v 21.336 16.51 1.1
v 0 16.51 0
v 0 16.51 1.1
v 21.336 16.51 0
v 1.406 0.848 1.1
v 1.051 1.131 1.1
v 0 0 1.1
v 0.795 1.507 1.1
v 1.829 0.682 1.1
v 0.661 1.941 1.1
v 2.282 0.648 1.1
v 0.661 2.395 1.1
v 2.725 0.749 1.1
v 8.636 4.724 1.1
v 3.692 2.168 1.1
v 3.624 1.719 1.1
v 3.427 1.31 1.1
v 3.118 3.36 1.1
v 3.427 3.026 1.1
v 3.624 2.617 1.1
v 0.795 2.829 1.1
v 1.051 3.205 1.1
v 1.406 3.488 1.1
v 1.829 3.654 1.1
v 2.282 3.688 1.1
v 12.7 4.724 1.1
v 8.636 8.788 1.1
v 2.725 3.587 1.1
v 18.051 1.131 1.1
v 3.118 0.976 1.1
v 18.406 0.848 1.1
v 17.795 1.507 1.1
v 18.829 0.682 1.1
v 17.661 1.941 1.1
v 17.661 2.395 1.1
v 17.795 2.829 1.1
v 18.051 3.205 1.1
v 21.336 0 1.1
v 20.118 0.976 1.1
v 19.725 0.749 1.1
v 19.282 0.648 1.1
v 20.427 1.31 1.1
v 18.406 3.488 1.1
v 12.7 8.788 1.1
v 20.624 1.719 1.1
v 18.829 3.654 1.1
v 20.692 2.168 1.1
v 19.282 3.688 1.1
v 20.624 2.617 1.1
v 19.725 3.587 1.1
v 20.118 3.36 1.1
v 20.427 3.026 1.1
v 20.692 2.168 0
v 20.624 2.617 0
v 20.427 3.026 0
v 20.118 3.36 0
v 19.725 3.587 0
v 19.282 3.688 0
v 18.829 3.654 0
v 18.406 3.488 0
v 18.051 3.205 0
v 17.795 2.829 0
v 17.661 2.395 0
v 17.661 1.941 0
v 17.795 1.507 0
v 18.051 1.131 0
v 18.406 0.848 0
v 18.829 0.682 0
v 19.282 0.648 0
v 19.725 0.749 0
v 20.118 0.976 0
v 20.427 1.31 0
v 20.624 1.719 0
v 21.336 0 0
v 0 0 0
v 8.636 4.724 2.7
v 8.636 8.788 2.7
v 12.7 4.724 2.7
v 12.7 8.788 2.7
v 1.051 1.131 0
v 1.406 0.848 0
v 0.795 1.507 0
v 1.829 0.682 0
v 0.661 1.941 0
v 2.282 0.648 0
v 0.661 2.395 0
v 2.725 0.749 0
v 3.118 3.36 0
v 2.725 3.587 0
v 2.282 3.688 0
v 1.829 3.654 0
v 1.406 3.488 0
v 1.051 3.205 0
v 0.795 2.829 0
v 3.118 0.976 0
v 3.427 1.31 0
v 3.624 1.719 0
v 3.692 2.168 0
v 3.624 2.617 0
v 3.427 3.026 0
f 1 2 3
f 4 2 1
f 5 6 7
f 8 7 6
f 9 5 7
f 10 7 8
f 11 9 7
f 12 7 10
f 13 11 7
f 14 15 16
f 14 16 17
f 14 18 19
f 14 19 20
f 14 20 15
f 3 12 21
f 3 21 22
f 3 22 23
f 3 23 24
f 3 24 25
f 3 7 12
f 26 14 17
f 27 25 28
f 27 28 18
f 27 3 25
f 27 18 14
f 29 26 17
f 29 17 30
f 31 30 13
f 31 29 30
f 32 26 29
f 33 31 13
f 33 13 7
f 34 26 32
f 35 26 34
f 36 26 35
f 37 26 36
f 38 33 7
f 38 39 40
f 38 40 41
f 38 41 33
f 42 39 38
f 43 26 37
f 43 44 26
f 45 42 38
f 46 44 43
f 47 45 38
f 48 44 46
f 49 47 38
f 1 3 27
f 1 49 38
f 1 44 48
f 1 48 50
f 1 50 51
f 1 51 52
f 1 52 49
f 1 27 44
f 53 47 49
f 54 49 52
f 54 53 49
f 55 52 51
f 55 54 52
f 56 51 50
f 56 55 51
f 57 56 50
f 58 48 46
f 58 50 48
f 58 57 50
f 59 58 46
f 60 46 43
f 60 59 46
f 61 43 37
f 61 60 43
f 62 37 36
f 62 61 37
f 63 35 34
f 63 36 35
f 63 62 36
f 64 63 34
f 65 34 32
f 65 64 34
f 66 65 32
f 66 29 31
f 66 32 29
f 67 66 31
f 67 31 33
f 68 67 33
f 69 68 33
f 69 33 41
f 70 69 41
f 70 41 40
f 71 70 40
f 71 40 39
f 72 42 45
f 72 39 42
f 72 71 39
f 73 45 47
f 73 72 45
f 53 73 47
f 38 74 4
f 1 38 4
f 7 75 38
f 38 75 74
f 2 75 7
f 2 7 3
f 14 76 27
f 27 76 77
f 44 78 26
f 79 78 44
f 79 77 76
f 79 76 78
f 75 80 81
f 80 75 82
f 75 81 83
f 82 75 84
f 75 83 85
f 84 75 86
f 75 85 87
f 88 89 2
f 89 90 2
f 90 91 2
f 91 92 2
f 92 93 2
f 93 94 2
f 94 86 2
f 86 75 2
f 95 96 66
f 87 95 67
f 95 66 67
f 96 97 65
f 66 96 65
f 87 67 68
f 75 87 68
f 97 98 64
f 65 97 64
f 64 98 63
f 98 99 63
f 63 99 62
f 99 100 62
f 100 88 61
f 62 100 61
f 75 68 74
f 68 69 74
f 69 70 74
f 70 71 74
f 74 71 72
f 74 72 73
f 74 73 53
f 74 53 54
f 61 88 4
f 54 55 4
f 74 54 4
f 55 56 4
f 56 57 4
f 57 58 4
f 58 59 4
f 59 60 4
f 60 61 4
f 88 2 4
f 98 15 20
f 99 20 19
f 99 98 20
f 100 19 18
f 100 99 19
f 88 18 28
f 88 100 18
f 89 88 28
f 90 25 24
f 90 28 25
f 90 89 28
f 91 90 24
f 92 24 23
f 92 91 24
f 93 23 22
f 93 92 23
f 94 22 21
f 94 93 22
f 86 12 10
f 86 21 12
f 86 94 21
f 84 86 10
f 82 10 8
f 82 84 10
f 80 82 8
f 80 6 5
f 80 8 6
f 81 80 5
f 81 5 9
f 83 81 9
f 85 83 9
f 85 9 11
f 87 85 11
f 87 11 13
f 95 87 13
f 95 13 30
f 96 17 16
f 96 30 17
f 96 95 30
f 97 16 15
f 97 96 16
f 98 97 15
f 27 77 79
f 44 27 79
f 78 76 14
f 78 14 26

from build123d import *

# Parameters (mm, degrees)
SKETCH1_W           = 21.336
SKETCH1_H           = 16.51
SKETCH1_R           = 1.524
BOSS_EXTRUDE1_DEPTH = 2.7
SKETCH2_OUTSIDE_W   = 28.758
SKETCH2_OUTSIDE_H   = 23.932
SKETCH2_OUTSIDE_W_2 = 4.064
SKETCH2_OUTSIDE_H_2 = 4.064
CUT_EXTRUDE1_DEPTH  = 1.6002


with BuildPart() as part:
    # Sketch1 → Boss-Extrude1 (new body)
    with BuildSketch(Plane.XY):
        with Locations((10.668, 8.255)):
            Rectangle(SKETCH1_W, SKETCH1_H)
        with Locations((2.168, 2.168)):
            Circle(SKETCH1_R, mode=Mode.SUBTRACT)
        with Locations((19.168, 2.168)):
            Circle(SKETCH1_R, mode=Mode.SUBTRACT)
    extrude(amount=BOSS_EXTRUDE1_DEPTH)

    # Sketch2 outside → Cut-Extrude1 (cut)
    with BuildSketch(Plane.XY.offset(2.7)):
        with Locations((10.668, 8.255)):
            Rectangle(SKETCH2_OUTSIDE_W, SKETCH2_OUTSIDE_H)
        with Locations((10.668, 6.7564)):
            Rectangle(SKETCH2_OUTSIDE_W_2, SKETCH2_OUTSIDE_H_2, mode=Mode.SUBTRACT)
    extrude(amount=-CUT_EXTRUDE1_DEPTH, mode=Mode.SUBTRACT)


solid = part.part
